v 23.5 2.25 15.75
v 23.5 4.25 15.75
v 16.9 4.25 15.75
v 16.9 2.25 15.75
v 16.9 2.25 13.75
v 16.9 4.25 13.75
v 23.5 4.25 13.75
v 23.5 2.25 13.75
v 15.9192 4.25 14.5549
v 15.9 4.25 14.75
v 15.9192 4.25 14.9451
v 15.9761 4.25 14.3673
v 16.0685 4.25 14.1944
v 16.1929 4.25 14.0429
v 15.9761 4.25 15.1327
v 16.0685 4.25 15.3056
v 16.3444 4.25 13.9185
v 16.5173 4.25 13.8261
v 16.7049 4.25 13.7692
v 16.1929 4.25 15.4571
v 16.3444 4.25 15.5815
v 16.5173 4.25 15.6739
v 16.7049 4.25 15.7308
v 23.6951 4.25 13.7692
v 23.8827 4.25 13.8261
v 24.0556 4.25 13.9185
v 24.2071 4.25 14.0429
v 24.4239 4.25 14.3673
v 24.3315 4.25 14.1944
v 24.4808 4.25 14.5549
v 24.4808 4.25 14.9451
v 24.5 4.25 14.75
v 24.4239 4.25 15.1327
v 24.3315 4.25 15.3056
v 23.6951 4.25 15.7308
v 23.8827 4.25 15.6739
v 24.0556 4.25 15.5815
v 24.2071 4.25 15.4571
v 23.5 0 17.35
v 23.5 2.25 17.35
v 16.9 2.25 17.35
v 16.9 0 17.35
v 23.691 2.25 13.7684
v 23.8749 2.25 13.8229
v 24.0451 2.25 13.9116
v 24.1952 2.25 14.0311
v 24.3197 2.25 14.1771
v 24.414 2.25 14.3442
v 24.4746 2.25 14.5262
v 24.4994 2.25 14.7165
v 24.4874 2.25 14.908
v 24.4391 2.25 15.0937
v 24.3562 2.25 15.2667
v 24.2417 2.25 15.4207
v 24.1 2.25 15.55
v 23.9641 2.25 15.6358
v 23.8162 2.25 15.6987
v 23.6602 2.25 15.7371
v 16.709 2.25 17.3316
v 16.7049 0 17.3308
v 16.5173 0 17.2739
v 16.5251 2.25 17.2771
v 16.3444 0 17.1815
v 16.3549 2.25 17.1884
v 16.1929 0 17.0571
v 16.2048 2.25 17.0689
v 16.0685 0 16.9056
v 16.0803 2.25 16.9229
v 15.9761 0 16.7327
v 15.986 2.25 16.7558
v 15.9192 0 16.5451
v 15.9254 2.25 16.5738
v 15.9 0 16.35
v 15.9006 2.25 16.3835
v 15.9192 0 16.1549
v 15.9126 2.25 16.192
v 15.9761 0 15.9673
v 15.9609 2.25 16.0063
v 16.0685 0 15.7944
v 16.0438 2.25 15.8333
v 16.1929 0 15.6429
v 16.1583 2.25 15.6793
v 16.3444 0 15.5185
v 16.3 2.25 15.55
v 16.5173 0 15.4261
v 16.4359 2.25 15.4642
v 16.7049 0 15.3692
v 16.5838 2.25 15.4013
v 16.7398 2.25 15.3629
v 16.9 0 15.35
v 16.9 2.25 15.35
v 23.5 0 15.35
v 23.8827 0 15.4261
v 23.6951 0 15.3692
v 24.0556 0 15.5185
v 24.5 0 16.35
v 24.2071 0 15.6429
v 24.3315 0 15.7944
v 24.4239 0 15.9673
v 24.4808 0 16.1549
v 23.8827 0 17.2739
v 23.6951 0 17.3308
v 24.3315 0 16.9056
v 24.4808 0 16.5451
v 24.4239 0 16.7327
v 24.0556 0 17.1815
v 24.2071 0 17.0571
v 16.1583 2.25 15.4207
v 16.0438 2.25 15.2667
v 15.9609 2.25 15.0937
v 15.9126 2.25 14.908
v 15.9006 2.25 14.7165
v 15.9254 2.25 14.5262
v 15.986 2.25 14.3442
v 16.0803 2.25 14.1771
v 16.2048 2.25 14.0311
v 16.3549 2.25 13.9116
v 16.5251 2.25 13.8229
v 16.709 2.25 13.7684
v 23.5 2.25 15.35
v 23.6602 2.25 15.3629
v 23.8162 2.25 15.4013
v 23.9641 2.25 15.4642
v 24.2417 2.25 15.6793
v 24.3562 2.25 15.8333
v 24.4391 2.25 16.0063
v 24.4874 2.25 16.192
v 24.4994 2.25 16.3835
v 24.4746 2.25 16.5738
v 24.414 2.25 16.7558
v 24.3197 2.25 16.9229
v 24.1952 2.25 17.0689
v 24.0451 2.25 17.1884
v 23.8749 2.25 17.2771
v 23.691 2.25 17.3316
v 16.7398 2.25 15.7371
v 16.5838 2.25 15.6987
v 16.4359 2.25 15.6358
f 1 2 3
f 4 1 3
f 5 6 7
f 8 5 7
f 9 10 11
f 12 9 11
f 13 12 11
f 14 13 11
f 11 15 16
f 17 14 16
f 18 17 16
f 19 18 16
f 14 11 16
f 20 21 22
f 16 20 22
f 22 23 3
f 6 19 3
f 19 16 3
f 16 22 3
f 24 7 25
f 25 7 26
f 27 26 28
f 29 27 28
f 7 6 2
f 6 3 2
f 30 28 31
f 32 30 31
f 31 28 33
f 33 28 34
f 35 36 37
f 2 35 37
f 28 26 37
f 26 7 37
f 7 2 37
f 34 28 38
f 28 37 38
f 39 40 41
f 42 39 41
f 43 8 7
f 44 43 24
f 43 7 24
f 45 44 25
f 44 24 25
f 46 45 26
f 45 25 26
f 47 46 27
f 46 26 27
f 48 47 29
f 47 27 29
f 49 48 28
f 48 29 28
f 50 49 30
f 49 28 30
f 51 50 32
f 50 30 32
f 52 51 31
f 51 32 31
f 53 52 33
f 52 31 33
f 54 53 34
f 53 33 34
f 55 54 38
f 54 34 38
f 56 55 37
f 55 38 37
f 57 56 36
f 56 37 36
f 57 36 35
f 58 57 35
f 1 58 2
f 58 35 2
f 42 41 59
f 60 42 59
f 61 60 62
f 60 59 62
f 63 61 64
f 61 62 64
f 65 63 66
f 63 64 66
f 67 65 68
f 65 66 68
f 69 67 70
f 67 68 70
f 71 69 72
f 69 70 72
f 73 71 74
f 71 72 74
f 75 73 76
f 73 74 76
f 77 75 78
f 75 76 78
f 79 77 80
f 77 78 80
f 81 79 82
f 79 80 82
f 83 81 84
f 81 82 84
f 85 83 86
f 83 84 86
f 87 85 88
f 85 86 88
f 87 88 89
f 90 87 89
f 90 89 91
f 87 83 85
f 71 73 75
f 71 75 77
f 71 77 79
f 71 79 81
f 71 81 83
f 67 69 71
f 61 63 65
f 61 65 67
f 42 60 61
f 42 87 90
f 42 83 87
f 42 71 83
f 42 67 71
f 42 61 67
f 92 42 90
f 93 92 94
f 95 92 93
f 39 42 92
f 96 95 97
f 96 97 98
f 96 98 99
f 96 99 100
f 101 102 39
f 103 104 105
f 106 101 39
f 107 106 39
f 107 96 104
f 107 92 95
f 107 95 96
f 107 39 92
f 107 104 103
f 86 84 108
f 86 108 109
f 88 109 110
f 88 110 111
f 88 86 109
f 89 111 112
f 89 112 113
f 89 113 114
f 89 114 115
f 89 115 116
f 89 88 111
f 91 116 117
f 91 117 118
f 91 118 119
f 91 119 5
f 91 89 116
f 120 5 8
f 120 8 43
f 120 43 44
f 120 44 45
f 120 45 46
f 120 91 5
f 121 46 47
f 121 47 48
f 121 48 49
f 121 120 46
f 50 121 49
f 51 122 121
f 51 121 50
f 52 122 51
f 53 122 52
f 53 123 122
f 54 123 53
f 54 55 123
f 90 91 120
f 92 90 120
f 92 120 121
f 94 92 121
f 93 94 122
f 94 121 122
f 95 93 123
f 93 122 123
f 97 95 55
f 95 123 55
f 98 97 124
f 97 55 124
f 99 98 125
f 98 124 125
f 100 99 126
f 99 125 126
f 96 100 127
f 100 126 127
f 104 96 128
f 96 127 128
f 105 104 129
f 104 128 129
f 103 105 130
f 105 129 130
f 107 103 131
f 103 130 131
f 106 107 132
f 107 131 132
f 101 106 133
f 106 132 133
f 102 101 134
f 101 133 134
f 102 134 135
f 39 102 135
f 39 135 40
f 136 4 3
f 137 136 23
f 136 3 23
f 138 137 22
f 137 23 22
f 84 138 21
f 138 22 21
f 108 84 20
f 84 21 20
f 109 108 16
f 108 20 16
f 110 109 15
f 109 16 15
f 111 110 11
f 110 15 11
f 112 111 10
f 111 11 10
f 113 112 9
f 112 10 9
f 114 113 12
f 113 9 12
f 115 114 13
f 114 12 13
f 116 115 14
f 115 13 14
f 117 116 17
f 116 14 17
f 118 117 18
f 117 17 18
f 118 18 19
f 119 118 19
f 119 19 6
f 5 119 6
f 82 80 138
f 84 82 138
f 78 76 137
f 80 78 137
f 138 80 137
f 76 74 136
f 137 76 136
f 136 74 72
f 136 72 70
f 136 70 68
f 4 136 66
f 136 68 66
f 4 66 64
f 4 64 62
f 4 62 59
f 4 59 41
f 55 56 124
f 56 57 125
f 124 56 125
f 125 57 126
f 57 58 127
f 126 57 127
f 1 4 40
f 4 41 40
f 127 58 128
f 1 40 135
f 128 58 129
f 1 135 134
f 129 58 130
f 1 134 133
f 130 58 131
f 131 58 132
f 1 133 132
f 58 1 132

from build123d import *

# Parameters (mm, degrees)
EXTRUDE006_DEPTH = 2
EXTRUDE005_DEPTH = 2.25


with BuildPart() as extrude006:
    # Sketch006 → Extrude006 (new body)
    with BuildSketch(Plane.XZ):
        with BuildLine():
            ThreePointArc((16.9, 15.75), (15.9, 14.75), (16.9, 13.75))
            Line((16.9, 13.75), (23.5, 13.75))
            ThreePointArc((23.5, 13.75), (24.5, 14.75), (23.5, 15.75))
            Line((23.5, 15.75), (16.9, 15.75))
        make_face()
    extrude(amount=EXTRUDE006_DEPTH)


with BuildPart() as extrude006_1:
    # Extrude006 placement: moved
    add(extrude006.part.moved(Location((0, 4, 0))))


with BuildPart() as lightinlet:
    # Sketch005 → Extrude005 (new body)
    with BuildSketch(Plane.XZ):
        with BuildLine():
            ThreePointArc((16.9, 17.35), (15.9, 16.35), (16.9, 15.35))
            Line((16.9, 15.35), (23.5, 15.35))
            ThreePointArc((23.5, 15.35), (24.5, 16.35), (23.5, 17.35))
            Line((23.5, 17.35), (16.9, 17.35))
        make_face()
    extrude(amount=EXTRUDE005_DEPTH)


with BuildPart() as lightinlet_1:
    # Extrude005 placement: moved
    add(lightinlet.part.moved(Location((0, 2, 0))))

    # Fusion008: union Extrude006
    add(extrude006_1.part)


with BuildPart() as lightinlet_2:
    # Fusion008 placement: moved
    add(lightinlet_1.part.moved(Location((0, 0.25, 0))))


solid = lightinlet_2.part
